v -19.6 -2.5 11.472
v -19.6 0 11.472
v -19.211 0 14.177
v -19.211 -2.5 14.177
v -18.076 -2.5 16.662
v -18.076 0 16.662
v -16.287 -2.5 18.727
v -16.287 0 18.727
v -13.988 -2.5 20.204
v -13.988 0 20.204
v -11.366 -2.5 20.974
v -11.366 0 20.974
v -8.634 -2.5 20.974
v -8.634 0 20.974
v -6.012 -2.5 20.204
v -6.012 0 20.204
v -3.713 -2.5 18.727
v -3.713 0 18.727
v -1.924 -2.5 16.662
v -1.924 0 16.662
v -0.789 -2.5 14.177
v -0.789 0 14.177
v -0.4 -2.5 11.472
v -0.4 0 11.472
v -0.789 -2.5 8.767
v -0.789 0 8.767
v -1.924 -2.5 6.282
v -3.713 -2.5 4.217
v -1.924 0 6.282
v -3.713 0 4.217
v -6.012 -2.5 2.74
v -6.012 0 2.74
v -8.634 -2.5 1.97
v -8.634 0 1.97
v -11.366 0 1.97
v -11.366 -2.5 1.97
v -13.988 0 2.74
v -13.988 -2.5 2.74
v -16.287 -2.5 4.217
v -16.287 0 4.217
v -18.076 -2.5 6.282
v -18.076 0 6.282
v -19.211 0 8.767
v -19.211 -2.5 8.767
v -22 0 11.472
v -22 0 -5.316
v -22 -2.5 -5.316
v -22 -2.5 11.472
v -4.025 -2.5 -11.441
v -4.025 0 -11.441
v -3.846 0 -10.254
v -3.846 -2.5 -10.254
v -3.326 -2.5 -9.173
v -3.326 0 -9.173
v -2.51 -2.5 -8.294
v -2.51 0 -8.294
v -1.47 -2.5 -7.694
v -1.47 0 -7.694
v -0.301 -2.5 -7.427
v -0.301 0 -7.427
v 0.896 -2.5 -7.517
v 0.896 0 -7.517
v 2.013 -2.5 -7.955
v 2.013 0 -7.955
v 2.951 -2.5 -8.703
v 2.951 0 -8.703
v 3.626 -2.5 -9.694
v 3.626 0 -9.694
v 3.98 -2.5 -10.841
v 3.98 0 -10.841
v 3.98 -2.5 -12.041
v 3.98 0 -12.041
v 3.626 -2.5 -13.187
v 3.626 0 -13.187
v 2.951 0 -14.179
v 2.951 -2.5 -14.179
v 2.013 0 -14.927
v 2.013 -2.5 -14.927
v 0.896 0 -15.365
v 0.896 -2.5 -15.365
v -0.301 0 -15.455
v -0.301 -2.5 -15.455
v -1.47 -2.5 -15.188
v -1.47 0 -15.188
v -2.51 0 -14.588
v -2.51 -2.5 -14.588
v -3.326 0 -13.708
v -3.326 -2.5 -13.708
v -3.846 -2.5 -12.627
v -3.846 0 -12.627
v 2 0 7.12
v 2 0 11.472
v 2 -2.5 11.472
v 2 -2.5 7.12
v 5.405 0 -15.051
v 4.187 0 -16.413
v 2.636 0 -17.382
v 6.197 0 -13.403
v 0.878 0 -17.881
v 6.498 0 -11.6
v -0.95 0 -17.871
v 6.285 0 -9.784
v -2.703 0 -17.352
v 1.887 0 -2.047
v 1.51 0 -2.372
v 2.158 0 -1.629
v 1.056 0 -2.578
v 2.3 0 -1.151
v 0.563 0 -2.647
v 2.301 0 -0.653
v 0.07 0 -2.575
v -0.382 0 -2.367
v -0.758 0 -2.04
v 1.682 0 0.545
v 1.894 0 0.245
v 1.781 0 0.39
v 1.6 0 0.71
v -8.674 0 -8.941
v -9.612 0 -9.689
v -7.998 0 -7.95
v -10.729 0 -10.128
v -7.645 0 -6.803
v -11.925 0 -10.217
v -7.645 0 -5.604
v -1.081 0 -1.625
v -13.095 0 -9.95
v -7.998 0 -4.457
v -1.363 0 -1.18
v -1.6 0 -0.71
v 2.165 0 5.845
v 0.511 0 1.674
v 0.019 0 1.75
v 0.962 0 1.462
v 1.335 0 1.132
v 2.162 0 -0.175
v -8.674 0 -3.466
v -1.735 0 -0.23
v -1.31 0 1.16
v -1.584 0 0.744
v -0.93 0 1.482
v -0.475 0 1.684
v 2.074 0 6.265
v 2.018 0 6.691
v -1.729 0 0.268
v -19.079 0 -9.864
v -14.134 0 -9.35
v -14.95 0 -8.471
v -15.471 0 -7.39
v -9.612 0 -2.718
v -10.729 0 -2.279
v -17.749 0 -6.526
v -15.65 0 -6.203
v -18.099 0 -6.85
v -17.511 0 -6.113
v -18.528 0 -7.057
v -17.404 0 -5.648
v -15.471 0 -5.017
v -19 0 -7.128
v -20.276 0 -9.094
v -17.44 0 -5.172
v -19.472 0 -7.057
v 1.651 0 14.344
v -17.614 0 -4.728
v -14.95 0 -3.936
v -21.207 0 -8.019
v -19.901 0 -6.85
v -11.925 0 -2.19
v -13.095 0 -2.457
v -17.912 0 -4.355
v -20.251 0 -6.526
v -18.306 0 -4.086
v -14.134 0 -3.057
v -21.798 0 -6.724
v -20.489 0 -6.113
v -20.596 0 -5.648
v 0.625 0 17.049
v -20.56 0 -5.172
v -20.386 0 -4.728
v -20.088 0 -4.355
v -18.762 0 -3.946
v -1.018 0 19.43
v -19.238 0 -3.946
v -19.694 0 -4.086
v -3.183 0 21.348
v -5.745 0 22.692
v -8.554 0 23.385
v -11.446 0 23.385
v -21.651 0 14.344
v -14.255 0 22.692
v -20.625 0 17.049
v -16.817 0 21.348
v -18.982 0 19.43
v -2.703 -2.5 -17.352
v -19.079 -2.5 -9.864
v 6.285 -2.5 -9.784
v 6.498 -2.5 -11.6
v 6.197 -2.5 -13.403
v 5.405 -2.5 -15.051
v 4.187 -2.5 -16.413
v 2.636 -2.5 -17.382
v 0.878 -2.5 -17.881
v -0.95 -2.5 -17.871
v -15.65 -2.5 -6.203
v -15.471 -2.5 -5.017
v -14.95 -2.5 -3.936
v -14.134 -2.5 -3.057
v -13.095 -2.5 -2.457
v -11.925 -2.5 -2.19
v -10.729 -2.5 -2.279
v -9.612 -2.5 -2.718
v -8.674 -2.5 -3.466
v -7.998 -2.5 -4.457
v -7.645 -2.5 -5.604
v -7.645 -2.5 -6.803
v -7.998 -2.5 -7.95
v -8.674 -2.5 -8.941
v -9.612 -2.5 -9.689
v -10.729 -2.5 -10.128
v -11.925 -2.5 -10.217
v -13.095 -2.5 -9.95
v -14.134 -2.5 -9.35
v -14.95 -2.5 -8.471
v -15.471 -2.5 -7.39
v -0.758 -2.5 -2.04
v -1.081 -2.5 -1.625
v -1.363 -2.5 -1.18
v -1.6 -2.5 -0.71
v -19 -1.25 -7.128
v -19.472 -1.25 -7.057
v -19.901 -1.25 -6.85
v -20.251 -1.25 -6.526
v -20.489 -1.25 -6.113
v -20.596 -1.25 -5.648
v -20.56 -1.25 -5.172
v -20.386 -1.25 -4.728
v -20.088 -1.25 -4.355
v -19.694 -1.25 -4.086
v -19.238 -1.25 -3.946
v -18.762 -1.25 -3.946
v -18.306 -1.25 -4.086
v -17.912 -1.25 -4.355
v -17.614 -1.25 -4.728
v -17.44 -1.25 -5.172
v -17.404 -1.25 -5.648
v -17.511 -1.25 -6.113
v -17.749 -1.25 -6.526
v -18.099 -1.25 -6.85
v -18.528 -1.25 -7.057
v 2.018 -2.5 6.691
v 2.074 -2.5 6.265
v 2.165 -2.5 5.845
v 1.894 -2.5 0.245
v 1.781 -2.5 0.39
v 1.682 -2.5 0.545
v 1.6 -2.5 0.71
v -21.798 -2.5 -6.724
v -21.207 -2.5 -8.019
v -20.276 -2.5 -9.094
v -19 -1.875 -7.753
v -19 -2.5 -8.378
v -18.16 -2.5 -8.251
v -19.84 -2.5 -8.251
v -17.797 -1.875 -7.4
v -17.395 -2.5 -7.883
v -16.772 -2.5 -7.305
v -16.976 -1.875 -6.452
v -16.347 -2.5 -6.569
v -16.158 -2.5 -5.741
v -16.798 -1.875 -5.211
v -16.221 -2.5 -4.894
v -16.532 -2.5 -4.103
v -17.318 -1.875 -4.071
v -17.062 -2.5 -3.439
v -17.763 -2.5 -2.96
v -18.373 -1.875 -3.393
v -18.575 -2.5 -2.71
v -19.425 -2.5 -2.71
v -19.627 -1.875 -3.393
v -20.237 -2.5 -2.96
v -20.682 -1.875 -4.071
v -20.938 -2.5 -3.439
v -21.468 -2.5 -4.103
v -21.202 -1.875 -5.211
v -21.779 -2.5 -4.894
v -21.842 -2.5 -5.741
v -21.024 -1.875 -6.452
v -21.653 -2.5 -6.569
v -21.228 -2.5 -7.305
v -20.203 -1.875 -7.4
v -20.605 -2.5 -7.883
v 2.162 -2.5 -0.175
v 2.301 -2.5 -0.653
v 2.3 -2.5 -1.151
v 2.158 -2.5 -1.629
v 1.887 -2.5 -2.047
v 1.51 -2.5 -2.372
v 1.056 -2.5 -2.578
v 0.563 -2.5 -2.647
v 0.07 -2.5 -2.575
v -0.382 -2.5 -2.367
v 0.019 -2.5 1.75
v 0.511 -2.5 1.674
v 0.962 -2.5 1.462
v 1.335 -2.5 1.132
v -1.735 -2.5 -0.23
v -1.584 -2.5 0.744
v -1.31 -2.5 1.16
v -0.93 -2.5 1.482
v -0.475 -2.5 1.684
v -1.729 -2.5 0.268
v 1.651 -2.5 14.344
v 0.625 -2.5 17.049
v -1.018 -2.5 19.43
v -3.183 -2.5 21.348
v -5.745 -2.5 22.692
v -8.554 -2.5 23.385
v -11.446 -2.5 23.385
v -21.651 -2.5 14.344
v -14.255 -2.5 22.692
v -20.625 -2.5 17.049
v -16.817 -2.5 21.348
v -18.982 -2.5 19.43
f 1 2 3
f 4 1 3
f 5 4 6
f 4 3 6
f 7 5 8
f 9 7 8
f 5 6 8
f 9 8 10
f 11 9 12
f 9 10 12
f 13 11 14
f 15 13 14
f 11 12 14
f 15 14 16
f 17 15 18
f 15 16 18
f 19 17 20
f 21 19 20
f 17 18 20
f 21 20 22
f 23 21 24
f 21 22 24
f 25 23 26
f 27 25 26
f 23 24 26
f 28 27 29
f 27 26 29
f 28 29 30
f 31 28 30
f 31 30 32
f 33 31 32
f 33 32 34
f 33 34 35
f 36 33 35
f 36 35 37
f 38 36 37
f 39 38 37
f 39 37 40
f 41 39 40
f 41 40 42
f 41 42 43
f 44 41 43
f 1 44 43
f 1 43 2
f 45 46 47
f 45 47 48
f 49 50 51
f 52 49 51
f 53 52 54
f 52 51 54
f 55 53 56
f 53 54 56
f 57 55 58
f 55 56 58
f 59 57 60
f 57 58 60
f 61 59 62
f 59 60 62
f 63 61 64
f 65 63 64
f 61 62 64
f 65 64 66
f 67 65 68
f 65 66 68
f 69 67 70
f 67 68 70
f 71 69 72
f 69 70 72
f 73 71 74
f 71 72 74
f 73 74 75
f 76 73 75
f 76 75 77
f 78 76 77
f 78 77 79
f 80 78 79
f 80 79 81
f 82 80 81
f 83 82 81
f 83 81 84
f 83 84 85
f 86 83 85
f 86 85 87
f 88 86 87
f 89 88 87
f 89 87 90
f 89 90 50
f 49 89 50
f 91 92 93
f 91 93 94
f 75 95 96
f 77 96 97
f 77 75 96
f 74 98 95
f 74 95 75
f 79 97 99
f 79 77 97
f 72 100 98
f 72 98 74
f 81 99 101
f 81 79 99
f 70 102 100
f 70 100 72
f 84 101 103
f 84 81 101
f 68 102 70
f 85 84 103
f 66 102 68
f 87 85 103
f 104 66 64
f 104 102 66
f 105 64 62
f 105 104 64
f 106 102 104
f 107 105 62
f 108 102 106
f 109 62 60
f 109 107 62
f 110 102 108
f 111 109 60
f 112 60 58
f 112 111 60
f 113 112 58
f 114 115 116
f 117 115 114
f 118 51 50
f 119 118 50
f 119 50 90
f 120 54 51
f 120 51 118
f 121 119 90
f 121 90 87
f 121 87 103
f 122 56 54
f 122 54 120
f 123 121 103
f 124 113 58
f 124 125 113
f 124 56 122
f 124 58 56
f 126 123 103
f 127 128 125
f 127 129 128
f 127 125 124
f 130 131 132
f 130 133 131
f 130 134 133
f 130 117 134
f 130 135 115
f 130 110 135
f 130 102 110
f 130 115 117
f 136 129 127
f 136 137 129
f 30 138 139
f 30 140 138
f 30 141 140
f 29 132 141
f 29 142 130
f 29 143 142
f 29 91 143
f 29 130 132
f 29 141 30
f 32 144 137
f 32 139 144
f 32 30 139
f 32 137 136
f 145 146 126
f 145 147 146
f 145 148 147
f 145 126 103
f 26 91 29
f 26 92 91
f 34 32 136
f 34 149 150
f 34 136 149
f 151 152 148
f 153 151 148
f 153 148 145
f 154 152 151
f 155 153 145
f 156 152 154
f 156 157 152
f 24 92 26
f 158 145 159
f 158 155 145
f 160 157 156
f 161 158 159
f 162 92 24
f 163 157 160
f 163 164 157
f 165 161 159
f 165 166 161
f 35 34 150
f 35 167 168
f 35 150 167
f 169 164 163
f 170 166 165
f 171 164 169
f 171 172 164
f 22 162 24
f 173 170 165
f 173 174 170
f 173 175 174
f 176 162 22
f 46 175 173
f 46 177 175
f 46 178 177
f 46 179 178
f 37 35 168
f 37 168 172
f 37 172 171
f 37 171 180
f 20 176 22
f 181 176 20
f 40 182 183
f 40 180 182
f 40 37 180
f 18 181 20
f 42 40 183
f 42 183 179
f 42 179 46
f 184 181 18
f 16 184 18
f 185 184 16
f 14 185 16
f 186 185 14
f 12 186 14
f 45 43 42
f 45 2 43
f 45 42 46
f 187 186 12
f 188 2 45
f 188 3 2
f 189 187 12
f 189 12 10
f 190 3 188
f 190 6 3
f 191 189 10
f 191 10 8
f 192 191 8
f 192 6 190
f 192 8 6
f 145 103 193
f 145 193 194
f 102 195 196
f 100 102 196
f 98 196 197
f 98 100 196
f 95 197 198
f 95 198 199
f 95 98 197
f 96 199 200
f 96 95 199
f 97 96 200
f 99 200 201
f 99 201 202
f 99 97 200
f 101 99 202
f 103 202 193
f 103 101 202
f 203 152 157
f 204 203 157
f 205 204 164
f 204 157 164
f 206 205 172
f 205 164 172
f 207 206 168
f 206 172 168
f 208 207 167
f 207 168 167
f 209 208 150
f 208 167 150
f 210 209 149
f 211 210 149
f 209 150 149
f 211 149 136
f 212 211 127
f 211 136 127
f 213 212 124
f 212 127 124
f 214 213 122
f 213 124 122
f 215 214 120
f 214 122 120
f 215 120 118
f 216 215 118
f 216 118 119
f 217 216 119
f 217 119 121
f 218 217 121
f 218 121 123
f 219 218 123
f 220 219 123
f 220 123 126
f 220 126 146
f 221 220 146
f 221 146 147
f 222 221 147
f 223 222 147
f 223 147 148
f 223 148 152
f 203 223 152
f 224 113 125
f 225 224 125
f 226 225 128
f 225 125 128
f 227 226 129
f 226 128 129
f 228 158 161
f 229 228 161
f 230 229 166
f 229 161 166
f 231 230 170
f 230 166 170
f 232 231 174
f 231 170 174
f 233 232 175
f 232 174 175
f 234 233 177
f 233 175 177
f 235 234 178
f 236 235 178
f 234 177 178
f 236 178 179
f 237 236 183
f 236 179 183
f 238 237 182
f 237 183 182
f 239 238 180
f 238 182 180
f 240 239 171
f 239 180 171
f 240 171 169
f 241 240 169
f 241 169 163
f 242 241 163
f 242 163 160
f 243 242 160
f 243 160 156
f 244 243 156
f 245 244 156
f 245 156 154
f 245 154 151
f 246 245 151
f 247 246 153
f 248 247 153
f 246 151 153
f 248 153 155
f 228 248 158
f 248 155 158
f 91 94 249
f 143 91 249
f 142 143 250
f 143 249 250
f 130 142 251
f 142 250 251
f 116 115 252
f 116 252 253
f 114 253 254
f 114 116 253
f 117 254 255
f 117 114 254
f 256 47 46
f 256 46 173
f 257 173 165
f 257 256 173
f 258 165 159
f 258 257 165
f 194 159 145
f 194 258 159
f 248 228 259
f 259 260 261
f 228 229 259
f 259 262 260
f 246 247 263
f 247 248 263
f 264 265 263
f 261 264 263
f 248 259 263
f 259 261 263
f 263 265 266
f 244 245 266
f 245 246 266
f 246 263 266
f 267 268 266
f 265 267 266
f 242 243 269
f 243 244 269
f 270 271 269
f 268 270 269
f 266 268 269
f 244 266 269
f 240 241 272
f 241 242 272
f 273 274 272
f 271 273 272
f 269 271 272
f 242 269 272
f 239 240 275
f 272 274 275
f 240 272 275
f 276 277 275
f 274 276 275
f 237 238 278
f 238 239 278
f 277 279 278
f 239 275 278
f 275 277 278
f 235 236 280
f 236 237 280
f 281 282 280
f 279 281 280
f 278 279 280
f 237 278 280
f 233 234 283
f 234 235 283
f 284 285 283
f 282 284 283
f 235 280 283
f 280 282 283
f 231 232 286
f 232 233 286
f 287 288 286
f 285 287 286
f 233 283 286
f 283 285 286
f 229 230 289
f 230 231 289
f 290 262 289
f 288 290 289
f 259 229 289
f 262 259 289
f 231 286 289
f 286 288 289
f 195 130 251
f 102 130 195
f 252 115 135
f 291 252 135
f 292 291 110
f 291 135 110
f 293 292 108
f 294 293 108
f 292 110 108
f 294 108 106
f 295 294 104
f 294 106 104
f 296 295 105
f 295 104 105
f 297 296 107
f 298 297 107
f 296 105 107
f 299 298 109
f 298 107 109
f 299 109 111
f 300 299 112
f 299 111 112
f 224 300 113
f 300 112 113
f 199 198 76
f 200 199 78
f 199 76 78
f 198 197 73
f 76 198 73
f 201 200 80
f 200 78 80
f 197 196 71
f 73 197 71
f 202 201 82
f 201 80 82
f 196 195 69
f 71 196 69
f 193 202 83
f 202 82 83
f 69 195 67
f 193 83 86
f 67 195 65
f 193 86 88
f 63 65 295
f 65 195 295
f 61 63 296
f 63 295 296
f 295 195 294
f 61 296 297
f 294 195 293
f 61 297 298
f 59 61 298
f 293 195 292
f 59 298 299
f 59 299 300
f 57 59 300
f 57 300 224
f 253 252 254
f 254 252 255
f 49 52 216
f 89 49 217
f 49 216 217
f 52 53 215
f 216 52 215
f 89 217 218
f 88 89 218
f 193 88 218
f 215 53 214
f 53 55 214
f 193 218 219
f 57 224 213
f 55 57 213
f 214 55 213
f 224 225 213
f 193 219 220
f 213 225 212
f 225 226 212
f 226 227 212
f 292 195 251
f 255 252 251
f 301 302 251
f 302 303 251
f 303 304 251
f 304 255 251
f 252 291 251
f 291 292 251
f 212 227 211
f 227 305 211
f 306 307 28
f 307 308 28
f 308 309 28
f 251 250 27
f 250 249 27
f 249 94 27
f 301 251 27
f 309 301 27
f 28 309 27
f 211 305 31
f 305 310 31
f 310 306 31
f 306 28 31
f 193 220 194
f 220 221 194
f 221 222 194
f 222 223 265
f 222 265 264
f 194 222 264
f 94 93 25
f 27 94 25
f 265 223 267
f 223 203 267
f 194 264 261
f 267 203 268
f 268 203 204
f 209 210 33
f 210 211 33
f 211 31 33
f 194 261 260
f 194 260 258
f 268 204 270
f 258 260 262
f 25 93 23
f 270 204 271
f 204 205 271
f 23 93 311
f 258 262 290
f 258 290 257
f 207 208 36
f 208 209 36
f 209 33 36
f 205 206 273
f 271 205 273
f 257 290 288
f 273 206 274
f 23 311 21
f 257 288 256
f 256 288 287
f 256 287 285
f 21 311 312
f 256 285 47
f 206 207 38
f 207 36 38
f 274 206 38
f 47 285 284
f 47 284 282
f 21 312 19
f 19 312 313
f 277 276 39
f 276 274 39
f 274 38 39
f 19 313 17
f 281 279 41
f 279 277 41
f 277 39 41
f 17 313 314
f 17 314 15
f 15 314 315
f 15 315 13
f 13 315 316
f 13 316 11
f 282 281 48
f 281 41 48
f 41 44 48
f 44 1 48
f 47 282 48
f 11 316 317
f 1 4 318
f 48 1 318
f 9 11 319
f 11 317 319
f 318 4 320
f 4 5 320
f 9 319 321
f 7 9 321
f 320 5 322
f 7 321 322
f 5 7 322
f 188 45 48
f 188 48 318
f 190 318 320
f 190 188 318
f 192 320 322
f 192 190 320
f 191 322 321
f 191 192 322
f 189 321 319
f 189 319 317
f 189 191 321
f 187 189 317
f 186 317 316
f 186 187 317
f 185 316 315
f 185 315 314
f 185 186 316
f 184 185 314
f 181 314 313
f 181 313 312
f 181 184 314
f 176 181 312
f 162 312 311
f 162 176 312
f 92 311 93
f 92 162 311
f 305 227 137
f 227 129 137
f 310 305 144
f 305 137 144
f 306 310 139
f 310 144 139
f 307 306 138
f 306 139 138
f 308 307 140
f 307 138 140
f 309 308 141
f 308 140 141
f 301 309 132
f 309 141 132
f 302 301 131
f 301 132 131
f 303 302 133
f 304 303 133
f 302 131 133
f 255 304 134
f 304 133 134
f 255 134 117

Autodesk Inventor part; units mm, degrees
ref_plane "YZ Plane" through (0, 0, 0) normal (1, 0, 0) x (0, 1, 0)
ref_plane "XZ Plane" through (0, 0, 0) normal (0, 1, 0) x (-1, 0, 0)
ref_plane "XY Plane" through (0, 0, 0) normal (0, 0, 1) x (1, 0, 0)
sketch "Sketch1" plane through (0, 0, 0) normal (0, 1, 0) x (-1, 0, 0)
  circle A0 centre (0, 0) radius 1.6
  circle A1 centre (10, 11.472032) radius 12
  line L0 (0, 0) -> (10, 11.472032) construction
  line L1 (0, 0) -> (4, 0) construction
  circle A2 centre (0, 0) radius 4
  circle A3 centre (0, -11.440846) radius 6.5
  line L2 (10, 11.472032) -> (0, -11.440846) construction
  line L3 (0, 0) -> (0, -11.440846) construction
  line L4 (0, 0) -> (0, -4) construction
  line L5 (22, 11.472032) -> (22, -8.527968)
  line L6 (22, -8.527968) -> (2.703128, -17.352115)
  line L7 (-2, 11.472032) -> (-2, 6.472032)
  line L8 (-2, 6.472032) -> (-6.285281, -9.783969)
  circle A4 centre (10, 11.472032) radius 9.6
  line L9 (10, 11.472032) -> (17.5, 11.472032) construction
  circle A5 centre (17.5, 11.472032) radius 1.075
  circle A6 centre (6.25, 17.967223) radius 1.075
  circle A7 centre (6.25, 4.976842) radius 1.075
  circle A8 centre (10, 11.472032) radius 6.1
  circle A9 centre (0, -11.440846) radius 4.025
  circle A10 centre (10, 11.472032) radius 10
  circle A11 centre (0, -11.440846) radius 5
  circle A12 centre (11.624641, -6.20346) radius 7.75
  circle A13 centre (11.624641, -6.20346) radius 4.025
  circle A14 centre (19, -5.527968) radius 1.6
  dimension "d5" = 8
  dimension "d0" = 3.2
  dimension "d1" = 24
  dimension "d2" = 4
  dimension "d4" = 10
  dimension "d6" = 13
  dimension "d7" = 25
  dimension "d8" = 17.5
  dimension "d12" = 0
  dimension "d13" = 20
  dimension "d14" = 5
  dimension "d17" = 19.2
  dimension "d19" = 7.5
  dimension "d20" = 2.15
  dimension "d23" = 360
  dimension "d25" = 12.2
  dimension "d26" = 8.05
  dimension "d38" = 20
  dimension "d39" = 10
  dimension "d40" = 15.5
  dimension "d41" = 8.05
  dimension "d42" = 3.2
  dimension "d43" = 3
  dimension "d44" = 3
sketch "Sketch1 outline for Extrusion1" plane through (0, 0, 0) normal (0, 1, 0) x (-1, 0, 0)
  line L0 (-2, 11.472032) -> (-2, 6.472032)
  line L1 (-2, 6.472032) -> (-6.285281, -9.783969)
  arc A0 (-6.285281, -9.783969) -> (2.703128, -17.352115) centre (0, -11.440846) ccw
  line L2 (2.703128, -17.352115) -> (22, -8.527968)
  line L3 (22, -8.527968) -> (22, 11.472032)
  arc A1 (22, 11.472032) -> (-2, 11.472032) centre (10, 11.472032) ccw
  circle A2 centre (0, -11.440846) radius 4.025
  circle A3 centre (11.624641, -6.20346) radius 4.025
  circle A4 centre (10, 11.472032) radius 9.6
extrude "Extrusion1" add sketch "Sketch1 outline for Extrusion1" against normal blind 2.5
fillet "Fillet1" radius 5 2 edges at (-22, -1.25, -8.528) (2, -1.25, 6.472)
sketch "Sketch2" plane through (0, -2.5, 0) normal (0, -1, 0) x (1, 0, 0)
  point P0 (0, 0)
  point P1 (-19, -5.527968)
hole "Hole3" at (-19, -2.5, -5.527968) direction (0, 1, 0) diameter 3.2 end through all countersink diameter 5.7 countersink angle 90
sketch "Sketch3" plane through (0, 0, 0) normal (0, 1, 0) x (1, 0, 0)
  circle A0 centre (0, 0) radius 1.75 construction
  line L0 (2, -1.472032) -> (3.318061, -1.472032) construction
  line L1 (6.285281, 9.783969) -> (2.165168, -5.845474)
  arc A1 (0.568061, 0.897337) -> (0, 0) centre (3.318061, -1.472032) ccw construction
  arc A2 (-0.757721, 2.039616) -> (-1.599646, 0.709671) centre (3.318061, -1.472032) ccw
  arc A3 (1.893843, -0.244942) -> (1.599646, -0.709671) centre (3.318061, -1.472032) ccw
  arc A4 (1.893843, -0.244942) -> (-0.757721, 2.039616) centre (0.568061, 0.897337) ccw
  arc A5 (-1.599646, 0.709671) -> (1.599646, -0.709671) centre (0, 0) ccw
  line L2 (2, -1.472032) -> (2, -6.472032) construction
  point P0 (2, -6.472032)
  dimension "d68" = 2.75
  dimension "d69" = 5
extrude "Extrusion3" cut sketch "Sketch3" against normal blind 2.5
properties part number "Dribbler Bracket B"
